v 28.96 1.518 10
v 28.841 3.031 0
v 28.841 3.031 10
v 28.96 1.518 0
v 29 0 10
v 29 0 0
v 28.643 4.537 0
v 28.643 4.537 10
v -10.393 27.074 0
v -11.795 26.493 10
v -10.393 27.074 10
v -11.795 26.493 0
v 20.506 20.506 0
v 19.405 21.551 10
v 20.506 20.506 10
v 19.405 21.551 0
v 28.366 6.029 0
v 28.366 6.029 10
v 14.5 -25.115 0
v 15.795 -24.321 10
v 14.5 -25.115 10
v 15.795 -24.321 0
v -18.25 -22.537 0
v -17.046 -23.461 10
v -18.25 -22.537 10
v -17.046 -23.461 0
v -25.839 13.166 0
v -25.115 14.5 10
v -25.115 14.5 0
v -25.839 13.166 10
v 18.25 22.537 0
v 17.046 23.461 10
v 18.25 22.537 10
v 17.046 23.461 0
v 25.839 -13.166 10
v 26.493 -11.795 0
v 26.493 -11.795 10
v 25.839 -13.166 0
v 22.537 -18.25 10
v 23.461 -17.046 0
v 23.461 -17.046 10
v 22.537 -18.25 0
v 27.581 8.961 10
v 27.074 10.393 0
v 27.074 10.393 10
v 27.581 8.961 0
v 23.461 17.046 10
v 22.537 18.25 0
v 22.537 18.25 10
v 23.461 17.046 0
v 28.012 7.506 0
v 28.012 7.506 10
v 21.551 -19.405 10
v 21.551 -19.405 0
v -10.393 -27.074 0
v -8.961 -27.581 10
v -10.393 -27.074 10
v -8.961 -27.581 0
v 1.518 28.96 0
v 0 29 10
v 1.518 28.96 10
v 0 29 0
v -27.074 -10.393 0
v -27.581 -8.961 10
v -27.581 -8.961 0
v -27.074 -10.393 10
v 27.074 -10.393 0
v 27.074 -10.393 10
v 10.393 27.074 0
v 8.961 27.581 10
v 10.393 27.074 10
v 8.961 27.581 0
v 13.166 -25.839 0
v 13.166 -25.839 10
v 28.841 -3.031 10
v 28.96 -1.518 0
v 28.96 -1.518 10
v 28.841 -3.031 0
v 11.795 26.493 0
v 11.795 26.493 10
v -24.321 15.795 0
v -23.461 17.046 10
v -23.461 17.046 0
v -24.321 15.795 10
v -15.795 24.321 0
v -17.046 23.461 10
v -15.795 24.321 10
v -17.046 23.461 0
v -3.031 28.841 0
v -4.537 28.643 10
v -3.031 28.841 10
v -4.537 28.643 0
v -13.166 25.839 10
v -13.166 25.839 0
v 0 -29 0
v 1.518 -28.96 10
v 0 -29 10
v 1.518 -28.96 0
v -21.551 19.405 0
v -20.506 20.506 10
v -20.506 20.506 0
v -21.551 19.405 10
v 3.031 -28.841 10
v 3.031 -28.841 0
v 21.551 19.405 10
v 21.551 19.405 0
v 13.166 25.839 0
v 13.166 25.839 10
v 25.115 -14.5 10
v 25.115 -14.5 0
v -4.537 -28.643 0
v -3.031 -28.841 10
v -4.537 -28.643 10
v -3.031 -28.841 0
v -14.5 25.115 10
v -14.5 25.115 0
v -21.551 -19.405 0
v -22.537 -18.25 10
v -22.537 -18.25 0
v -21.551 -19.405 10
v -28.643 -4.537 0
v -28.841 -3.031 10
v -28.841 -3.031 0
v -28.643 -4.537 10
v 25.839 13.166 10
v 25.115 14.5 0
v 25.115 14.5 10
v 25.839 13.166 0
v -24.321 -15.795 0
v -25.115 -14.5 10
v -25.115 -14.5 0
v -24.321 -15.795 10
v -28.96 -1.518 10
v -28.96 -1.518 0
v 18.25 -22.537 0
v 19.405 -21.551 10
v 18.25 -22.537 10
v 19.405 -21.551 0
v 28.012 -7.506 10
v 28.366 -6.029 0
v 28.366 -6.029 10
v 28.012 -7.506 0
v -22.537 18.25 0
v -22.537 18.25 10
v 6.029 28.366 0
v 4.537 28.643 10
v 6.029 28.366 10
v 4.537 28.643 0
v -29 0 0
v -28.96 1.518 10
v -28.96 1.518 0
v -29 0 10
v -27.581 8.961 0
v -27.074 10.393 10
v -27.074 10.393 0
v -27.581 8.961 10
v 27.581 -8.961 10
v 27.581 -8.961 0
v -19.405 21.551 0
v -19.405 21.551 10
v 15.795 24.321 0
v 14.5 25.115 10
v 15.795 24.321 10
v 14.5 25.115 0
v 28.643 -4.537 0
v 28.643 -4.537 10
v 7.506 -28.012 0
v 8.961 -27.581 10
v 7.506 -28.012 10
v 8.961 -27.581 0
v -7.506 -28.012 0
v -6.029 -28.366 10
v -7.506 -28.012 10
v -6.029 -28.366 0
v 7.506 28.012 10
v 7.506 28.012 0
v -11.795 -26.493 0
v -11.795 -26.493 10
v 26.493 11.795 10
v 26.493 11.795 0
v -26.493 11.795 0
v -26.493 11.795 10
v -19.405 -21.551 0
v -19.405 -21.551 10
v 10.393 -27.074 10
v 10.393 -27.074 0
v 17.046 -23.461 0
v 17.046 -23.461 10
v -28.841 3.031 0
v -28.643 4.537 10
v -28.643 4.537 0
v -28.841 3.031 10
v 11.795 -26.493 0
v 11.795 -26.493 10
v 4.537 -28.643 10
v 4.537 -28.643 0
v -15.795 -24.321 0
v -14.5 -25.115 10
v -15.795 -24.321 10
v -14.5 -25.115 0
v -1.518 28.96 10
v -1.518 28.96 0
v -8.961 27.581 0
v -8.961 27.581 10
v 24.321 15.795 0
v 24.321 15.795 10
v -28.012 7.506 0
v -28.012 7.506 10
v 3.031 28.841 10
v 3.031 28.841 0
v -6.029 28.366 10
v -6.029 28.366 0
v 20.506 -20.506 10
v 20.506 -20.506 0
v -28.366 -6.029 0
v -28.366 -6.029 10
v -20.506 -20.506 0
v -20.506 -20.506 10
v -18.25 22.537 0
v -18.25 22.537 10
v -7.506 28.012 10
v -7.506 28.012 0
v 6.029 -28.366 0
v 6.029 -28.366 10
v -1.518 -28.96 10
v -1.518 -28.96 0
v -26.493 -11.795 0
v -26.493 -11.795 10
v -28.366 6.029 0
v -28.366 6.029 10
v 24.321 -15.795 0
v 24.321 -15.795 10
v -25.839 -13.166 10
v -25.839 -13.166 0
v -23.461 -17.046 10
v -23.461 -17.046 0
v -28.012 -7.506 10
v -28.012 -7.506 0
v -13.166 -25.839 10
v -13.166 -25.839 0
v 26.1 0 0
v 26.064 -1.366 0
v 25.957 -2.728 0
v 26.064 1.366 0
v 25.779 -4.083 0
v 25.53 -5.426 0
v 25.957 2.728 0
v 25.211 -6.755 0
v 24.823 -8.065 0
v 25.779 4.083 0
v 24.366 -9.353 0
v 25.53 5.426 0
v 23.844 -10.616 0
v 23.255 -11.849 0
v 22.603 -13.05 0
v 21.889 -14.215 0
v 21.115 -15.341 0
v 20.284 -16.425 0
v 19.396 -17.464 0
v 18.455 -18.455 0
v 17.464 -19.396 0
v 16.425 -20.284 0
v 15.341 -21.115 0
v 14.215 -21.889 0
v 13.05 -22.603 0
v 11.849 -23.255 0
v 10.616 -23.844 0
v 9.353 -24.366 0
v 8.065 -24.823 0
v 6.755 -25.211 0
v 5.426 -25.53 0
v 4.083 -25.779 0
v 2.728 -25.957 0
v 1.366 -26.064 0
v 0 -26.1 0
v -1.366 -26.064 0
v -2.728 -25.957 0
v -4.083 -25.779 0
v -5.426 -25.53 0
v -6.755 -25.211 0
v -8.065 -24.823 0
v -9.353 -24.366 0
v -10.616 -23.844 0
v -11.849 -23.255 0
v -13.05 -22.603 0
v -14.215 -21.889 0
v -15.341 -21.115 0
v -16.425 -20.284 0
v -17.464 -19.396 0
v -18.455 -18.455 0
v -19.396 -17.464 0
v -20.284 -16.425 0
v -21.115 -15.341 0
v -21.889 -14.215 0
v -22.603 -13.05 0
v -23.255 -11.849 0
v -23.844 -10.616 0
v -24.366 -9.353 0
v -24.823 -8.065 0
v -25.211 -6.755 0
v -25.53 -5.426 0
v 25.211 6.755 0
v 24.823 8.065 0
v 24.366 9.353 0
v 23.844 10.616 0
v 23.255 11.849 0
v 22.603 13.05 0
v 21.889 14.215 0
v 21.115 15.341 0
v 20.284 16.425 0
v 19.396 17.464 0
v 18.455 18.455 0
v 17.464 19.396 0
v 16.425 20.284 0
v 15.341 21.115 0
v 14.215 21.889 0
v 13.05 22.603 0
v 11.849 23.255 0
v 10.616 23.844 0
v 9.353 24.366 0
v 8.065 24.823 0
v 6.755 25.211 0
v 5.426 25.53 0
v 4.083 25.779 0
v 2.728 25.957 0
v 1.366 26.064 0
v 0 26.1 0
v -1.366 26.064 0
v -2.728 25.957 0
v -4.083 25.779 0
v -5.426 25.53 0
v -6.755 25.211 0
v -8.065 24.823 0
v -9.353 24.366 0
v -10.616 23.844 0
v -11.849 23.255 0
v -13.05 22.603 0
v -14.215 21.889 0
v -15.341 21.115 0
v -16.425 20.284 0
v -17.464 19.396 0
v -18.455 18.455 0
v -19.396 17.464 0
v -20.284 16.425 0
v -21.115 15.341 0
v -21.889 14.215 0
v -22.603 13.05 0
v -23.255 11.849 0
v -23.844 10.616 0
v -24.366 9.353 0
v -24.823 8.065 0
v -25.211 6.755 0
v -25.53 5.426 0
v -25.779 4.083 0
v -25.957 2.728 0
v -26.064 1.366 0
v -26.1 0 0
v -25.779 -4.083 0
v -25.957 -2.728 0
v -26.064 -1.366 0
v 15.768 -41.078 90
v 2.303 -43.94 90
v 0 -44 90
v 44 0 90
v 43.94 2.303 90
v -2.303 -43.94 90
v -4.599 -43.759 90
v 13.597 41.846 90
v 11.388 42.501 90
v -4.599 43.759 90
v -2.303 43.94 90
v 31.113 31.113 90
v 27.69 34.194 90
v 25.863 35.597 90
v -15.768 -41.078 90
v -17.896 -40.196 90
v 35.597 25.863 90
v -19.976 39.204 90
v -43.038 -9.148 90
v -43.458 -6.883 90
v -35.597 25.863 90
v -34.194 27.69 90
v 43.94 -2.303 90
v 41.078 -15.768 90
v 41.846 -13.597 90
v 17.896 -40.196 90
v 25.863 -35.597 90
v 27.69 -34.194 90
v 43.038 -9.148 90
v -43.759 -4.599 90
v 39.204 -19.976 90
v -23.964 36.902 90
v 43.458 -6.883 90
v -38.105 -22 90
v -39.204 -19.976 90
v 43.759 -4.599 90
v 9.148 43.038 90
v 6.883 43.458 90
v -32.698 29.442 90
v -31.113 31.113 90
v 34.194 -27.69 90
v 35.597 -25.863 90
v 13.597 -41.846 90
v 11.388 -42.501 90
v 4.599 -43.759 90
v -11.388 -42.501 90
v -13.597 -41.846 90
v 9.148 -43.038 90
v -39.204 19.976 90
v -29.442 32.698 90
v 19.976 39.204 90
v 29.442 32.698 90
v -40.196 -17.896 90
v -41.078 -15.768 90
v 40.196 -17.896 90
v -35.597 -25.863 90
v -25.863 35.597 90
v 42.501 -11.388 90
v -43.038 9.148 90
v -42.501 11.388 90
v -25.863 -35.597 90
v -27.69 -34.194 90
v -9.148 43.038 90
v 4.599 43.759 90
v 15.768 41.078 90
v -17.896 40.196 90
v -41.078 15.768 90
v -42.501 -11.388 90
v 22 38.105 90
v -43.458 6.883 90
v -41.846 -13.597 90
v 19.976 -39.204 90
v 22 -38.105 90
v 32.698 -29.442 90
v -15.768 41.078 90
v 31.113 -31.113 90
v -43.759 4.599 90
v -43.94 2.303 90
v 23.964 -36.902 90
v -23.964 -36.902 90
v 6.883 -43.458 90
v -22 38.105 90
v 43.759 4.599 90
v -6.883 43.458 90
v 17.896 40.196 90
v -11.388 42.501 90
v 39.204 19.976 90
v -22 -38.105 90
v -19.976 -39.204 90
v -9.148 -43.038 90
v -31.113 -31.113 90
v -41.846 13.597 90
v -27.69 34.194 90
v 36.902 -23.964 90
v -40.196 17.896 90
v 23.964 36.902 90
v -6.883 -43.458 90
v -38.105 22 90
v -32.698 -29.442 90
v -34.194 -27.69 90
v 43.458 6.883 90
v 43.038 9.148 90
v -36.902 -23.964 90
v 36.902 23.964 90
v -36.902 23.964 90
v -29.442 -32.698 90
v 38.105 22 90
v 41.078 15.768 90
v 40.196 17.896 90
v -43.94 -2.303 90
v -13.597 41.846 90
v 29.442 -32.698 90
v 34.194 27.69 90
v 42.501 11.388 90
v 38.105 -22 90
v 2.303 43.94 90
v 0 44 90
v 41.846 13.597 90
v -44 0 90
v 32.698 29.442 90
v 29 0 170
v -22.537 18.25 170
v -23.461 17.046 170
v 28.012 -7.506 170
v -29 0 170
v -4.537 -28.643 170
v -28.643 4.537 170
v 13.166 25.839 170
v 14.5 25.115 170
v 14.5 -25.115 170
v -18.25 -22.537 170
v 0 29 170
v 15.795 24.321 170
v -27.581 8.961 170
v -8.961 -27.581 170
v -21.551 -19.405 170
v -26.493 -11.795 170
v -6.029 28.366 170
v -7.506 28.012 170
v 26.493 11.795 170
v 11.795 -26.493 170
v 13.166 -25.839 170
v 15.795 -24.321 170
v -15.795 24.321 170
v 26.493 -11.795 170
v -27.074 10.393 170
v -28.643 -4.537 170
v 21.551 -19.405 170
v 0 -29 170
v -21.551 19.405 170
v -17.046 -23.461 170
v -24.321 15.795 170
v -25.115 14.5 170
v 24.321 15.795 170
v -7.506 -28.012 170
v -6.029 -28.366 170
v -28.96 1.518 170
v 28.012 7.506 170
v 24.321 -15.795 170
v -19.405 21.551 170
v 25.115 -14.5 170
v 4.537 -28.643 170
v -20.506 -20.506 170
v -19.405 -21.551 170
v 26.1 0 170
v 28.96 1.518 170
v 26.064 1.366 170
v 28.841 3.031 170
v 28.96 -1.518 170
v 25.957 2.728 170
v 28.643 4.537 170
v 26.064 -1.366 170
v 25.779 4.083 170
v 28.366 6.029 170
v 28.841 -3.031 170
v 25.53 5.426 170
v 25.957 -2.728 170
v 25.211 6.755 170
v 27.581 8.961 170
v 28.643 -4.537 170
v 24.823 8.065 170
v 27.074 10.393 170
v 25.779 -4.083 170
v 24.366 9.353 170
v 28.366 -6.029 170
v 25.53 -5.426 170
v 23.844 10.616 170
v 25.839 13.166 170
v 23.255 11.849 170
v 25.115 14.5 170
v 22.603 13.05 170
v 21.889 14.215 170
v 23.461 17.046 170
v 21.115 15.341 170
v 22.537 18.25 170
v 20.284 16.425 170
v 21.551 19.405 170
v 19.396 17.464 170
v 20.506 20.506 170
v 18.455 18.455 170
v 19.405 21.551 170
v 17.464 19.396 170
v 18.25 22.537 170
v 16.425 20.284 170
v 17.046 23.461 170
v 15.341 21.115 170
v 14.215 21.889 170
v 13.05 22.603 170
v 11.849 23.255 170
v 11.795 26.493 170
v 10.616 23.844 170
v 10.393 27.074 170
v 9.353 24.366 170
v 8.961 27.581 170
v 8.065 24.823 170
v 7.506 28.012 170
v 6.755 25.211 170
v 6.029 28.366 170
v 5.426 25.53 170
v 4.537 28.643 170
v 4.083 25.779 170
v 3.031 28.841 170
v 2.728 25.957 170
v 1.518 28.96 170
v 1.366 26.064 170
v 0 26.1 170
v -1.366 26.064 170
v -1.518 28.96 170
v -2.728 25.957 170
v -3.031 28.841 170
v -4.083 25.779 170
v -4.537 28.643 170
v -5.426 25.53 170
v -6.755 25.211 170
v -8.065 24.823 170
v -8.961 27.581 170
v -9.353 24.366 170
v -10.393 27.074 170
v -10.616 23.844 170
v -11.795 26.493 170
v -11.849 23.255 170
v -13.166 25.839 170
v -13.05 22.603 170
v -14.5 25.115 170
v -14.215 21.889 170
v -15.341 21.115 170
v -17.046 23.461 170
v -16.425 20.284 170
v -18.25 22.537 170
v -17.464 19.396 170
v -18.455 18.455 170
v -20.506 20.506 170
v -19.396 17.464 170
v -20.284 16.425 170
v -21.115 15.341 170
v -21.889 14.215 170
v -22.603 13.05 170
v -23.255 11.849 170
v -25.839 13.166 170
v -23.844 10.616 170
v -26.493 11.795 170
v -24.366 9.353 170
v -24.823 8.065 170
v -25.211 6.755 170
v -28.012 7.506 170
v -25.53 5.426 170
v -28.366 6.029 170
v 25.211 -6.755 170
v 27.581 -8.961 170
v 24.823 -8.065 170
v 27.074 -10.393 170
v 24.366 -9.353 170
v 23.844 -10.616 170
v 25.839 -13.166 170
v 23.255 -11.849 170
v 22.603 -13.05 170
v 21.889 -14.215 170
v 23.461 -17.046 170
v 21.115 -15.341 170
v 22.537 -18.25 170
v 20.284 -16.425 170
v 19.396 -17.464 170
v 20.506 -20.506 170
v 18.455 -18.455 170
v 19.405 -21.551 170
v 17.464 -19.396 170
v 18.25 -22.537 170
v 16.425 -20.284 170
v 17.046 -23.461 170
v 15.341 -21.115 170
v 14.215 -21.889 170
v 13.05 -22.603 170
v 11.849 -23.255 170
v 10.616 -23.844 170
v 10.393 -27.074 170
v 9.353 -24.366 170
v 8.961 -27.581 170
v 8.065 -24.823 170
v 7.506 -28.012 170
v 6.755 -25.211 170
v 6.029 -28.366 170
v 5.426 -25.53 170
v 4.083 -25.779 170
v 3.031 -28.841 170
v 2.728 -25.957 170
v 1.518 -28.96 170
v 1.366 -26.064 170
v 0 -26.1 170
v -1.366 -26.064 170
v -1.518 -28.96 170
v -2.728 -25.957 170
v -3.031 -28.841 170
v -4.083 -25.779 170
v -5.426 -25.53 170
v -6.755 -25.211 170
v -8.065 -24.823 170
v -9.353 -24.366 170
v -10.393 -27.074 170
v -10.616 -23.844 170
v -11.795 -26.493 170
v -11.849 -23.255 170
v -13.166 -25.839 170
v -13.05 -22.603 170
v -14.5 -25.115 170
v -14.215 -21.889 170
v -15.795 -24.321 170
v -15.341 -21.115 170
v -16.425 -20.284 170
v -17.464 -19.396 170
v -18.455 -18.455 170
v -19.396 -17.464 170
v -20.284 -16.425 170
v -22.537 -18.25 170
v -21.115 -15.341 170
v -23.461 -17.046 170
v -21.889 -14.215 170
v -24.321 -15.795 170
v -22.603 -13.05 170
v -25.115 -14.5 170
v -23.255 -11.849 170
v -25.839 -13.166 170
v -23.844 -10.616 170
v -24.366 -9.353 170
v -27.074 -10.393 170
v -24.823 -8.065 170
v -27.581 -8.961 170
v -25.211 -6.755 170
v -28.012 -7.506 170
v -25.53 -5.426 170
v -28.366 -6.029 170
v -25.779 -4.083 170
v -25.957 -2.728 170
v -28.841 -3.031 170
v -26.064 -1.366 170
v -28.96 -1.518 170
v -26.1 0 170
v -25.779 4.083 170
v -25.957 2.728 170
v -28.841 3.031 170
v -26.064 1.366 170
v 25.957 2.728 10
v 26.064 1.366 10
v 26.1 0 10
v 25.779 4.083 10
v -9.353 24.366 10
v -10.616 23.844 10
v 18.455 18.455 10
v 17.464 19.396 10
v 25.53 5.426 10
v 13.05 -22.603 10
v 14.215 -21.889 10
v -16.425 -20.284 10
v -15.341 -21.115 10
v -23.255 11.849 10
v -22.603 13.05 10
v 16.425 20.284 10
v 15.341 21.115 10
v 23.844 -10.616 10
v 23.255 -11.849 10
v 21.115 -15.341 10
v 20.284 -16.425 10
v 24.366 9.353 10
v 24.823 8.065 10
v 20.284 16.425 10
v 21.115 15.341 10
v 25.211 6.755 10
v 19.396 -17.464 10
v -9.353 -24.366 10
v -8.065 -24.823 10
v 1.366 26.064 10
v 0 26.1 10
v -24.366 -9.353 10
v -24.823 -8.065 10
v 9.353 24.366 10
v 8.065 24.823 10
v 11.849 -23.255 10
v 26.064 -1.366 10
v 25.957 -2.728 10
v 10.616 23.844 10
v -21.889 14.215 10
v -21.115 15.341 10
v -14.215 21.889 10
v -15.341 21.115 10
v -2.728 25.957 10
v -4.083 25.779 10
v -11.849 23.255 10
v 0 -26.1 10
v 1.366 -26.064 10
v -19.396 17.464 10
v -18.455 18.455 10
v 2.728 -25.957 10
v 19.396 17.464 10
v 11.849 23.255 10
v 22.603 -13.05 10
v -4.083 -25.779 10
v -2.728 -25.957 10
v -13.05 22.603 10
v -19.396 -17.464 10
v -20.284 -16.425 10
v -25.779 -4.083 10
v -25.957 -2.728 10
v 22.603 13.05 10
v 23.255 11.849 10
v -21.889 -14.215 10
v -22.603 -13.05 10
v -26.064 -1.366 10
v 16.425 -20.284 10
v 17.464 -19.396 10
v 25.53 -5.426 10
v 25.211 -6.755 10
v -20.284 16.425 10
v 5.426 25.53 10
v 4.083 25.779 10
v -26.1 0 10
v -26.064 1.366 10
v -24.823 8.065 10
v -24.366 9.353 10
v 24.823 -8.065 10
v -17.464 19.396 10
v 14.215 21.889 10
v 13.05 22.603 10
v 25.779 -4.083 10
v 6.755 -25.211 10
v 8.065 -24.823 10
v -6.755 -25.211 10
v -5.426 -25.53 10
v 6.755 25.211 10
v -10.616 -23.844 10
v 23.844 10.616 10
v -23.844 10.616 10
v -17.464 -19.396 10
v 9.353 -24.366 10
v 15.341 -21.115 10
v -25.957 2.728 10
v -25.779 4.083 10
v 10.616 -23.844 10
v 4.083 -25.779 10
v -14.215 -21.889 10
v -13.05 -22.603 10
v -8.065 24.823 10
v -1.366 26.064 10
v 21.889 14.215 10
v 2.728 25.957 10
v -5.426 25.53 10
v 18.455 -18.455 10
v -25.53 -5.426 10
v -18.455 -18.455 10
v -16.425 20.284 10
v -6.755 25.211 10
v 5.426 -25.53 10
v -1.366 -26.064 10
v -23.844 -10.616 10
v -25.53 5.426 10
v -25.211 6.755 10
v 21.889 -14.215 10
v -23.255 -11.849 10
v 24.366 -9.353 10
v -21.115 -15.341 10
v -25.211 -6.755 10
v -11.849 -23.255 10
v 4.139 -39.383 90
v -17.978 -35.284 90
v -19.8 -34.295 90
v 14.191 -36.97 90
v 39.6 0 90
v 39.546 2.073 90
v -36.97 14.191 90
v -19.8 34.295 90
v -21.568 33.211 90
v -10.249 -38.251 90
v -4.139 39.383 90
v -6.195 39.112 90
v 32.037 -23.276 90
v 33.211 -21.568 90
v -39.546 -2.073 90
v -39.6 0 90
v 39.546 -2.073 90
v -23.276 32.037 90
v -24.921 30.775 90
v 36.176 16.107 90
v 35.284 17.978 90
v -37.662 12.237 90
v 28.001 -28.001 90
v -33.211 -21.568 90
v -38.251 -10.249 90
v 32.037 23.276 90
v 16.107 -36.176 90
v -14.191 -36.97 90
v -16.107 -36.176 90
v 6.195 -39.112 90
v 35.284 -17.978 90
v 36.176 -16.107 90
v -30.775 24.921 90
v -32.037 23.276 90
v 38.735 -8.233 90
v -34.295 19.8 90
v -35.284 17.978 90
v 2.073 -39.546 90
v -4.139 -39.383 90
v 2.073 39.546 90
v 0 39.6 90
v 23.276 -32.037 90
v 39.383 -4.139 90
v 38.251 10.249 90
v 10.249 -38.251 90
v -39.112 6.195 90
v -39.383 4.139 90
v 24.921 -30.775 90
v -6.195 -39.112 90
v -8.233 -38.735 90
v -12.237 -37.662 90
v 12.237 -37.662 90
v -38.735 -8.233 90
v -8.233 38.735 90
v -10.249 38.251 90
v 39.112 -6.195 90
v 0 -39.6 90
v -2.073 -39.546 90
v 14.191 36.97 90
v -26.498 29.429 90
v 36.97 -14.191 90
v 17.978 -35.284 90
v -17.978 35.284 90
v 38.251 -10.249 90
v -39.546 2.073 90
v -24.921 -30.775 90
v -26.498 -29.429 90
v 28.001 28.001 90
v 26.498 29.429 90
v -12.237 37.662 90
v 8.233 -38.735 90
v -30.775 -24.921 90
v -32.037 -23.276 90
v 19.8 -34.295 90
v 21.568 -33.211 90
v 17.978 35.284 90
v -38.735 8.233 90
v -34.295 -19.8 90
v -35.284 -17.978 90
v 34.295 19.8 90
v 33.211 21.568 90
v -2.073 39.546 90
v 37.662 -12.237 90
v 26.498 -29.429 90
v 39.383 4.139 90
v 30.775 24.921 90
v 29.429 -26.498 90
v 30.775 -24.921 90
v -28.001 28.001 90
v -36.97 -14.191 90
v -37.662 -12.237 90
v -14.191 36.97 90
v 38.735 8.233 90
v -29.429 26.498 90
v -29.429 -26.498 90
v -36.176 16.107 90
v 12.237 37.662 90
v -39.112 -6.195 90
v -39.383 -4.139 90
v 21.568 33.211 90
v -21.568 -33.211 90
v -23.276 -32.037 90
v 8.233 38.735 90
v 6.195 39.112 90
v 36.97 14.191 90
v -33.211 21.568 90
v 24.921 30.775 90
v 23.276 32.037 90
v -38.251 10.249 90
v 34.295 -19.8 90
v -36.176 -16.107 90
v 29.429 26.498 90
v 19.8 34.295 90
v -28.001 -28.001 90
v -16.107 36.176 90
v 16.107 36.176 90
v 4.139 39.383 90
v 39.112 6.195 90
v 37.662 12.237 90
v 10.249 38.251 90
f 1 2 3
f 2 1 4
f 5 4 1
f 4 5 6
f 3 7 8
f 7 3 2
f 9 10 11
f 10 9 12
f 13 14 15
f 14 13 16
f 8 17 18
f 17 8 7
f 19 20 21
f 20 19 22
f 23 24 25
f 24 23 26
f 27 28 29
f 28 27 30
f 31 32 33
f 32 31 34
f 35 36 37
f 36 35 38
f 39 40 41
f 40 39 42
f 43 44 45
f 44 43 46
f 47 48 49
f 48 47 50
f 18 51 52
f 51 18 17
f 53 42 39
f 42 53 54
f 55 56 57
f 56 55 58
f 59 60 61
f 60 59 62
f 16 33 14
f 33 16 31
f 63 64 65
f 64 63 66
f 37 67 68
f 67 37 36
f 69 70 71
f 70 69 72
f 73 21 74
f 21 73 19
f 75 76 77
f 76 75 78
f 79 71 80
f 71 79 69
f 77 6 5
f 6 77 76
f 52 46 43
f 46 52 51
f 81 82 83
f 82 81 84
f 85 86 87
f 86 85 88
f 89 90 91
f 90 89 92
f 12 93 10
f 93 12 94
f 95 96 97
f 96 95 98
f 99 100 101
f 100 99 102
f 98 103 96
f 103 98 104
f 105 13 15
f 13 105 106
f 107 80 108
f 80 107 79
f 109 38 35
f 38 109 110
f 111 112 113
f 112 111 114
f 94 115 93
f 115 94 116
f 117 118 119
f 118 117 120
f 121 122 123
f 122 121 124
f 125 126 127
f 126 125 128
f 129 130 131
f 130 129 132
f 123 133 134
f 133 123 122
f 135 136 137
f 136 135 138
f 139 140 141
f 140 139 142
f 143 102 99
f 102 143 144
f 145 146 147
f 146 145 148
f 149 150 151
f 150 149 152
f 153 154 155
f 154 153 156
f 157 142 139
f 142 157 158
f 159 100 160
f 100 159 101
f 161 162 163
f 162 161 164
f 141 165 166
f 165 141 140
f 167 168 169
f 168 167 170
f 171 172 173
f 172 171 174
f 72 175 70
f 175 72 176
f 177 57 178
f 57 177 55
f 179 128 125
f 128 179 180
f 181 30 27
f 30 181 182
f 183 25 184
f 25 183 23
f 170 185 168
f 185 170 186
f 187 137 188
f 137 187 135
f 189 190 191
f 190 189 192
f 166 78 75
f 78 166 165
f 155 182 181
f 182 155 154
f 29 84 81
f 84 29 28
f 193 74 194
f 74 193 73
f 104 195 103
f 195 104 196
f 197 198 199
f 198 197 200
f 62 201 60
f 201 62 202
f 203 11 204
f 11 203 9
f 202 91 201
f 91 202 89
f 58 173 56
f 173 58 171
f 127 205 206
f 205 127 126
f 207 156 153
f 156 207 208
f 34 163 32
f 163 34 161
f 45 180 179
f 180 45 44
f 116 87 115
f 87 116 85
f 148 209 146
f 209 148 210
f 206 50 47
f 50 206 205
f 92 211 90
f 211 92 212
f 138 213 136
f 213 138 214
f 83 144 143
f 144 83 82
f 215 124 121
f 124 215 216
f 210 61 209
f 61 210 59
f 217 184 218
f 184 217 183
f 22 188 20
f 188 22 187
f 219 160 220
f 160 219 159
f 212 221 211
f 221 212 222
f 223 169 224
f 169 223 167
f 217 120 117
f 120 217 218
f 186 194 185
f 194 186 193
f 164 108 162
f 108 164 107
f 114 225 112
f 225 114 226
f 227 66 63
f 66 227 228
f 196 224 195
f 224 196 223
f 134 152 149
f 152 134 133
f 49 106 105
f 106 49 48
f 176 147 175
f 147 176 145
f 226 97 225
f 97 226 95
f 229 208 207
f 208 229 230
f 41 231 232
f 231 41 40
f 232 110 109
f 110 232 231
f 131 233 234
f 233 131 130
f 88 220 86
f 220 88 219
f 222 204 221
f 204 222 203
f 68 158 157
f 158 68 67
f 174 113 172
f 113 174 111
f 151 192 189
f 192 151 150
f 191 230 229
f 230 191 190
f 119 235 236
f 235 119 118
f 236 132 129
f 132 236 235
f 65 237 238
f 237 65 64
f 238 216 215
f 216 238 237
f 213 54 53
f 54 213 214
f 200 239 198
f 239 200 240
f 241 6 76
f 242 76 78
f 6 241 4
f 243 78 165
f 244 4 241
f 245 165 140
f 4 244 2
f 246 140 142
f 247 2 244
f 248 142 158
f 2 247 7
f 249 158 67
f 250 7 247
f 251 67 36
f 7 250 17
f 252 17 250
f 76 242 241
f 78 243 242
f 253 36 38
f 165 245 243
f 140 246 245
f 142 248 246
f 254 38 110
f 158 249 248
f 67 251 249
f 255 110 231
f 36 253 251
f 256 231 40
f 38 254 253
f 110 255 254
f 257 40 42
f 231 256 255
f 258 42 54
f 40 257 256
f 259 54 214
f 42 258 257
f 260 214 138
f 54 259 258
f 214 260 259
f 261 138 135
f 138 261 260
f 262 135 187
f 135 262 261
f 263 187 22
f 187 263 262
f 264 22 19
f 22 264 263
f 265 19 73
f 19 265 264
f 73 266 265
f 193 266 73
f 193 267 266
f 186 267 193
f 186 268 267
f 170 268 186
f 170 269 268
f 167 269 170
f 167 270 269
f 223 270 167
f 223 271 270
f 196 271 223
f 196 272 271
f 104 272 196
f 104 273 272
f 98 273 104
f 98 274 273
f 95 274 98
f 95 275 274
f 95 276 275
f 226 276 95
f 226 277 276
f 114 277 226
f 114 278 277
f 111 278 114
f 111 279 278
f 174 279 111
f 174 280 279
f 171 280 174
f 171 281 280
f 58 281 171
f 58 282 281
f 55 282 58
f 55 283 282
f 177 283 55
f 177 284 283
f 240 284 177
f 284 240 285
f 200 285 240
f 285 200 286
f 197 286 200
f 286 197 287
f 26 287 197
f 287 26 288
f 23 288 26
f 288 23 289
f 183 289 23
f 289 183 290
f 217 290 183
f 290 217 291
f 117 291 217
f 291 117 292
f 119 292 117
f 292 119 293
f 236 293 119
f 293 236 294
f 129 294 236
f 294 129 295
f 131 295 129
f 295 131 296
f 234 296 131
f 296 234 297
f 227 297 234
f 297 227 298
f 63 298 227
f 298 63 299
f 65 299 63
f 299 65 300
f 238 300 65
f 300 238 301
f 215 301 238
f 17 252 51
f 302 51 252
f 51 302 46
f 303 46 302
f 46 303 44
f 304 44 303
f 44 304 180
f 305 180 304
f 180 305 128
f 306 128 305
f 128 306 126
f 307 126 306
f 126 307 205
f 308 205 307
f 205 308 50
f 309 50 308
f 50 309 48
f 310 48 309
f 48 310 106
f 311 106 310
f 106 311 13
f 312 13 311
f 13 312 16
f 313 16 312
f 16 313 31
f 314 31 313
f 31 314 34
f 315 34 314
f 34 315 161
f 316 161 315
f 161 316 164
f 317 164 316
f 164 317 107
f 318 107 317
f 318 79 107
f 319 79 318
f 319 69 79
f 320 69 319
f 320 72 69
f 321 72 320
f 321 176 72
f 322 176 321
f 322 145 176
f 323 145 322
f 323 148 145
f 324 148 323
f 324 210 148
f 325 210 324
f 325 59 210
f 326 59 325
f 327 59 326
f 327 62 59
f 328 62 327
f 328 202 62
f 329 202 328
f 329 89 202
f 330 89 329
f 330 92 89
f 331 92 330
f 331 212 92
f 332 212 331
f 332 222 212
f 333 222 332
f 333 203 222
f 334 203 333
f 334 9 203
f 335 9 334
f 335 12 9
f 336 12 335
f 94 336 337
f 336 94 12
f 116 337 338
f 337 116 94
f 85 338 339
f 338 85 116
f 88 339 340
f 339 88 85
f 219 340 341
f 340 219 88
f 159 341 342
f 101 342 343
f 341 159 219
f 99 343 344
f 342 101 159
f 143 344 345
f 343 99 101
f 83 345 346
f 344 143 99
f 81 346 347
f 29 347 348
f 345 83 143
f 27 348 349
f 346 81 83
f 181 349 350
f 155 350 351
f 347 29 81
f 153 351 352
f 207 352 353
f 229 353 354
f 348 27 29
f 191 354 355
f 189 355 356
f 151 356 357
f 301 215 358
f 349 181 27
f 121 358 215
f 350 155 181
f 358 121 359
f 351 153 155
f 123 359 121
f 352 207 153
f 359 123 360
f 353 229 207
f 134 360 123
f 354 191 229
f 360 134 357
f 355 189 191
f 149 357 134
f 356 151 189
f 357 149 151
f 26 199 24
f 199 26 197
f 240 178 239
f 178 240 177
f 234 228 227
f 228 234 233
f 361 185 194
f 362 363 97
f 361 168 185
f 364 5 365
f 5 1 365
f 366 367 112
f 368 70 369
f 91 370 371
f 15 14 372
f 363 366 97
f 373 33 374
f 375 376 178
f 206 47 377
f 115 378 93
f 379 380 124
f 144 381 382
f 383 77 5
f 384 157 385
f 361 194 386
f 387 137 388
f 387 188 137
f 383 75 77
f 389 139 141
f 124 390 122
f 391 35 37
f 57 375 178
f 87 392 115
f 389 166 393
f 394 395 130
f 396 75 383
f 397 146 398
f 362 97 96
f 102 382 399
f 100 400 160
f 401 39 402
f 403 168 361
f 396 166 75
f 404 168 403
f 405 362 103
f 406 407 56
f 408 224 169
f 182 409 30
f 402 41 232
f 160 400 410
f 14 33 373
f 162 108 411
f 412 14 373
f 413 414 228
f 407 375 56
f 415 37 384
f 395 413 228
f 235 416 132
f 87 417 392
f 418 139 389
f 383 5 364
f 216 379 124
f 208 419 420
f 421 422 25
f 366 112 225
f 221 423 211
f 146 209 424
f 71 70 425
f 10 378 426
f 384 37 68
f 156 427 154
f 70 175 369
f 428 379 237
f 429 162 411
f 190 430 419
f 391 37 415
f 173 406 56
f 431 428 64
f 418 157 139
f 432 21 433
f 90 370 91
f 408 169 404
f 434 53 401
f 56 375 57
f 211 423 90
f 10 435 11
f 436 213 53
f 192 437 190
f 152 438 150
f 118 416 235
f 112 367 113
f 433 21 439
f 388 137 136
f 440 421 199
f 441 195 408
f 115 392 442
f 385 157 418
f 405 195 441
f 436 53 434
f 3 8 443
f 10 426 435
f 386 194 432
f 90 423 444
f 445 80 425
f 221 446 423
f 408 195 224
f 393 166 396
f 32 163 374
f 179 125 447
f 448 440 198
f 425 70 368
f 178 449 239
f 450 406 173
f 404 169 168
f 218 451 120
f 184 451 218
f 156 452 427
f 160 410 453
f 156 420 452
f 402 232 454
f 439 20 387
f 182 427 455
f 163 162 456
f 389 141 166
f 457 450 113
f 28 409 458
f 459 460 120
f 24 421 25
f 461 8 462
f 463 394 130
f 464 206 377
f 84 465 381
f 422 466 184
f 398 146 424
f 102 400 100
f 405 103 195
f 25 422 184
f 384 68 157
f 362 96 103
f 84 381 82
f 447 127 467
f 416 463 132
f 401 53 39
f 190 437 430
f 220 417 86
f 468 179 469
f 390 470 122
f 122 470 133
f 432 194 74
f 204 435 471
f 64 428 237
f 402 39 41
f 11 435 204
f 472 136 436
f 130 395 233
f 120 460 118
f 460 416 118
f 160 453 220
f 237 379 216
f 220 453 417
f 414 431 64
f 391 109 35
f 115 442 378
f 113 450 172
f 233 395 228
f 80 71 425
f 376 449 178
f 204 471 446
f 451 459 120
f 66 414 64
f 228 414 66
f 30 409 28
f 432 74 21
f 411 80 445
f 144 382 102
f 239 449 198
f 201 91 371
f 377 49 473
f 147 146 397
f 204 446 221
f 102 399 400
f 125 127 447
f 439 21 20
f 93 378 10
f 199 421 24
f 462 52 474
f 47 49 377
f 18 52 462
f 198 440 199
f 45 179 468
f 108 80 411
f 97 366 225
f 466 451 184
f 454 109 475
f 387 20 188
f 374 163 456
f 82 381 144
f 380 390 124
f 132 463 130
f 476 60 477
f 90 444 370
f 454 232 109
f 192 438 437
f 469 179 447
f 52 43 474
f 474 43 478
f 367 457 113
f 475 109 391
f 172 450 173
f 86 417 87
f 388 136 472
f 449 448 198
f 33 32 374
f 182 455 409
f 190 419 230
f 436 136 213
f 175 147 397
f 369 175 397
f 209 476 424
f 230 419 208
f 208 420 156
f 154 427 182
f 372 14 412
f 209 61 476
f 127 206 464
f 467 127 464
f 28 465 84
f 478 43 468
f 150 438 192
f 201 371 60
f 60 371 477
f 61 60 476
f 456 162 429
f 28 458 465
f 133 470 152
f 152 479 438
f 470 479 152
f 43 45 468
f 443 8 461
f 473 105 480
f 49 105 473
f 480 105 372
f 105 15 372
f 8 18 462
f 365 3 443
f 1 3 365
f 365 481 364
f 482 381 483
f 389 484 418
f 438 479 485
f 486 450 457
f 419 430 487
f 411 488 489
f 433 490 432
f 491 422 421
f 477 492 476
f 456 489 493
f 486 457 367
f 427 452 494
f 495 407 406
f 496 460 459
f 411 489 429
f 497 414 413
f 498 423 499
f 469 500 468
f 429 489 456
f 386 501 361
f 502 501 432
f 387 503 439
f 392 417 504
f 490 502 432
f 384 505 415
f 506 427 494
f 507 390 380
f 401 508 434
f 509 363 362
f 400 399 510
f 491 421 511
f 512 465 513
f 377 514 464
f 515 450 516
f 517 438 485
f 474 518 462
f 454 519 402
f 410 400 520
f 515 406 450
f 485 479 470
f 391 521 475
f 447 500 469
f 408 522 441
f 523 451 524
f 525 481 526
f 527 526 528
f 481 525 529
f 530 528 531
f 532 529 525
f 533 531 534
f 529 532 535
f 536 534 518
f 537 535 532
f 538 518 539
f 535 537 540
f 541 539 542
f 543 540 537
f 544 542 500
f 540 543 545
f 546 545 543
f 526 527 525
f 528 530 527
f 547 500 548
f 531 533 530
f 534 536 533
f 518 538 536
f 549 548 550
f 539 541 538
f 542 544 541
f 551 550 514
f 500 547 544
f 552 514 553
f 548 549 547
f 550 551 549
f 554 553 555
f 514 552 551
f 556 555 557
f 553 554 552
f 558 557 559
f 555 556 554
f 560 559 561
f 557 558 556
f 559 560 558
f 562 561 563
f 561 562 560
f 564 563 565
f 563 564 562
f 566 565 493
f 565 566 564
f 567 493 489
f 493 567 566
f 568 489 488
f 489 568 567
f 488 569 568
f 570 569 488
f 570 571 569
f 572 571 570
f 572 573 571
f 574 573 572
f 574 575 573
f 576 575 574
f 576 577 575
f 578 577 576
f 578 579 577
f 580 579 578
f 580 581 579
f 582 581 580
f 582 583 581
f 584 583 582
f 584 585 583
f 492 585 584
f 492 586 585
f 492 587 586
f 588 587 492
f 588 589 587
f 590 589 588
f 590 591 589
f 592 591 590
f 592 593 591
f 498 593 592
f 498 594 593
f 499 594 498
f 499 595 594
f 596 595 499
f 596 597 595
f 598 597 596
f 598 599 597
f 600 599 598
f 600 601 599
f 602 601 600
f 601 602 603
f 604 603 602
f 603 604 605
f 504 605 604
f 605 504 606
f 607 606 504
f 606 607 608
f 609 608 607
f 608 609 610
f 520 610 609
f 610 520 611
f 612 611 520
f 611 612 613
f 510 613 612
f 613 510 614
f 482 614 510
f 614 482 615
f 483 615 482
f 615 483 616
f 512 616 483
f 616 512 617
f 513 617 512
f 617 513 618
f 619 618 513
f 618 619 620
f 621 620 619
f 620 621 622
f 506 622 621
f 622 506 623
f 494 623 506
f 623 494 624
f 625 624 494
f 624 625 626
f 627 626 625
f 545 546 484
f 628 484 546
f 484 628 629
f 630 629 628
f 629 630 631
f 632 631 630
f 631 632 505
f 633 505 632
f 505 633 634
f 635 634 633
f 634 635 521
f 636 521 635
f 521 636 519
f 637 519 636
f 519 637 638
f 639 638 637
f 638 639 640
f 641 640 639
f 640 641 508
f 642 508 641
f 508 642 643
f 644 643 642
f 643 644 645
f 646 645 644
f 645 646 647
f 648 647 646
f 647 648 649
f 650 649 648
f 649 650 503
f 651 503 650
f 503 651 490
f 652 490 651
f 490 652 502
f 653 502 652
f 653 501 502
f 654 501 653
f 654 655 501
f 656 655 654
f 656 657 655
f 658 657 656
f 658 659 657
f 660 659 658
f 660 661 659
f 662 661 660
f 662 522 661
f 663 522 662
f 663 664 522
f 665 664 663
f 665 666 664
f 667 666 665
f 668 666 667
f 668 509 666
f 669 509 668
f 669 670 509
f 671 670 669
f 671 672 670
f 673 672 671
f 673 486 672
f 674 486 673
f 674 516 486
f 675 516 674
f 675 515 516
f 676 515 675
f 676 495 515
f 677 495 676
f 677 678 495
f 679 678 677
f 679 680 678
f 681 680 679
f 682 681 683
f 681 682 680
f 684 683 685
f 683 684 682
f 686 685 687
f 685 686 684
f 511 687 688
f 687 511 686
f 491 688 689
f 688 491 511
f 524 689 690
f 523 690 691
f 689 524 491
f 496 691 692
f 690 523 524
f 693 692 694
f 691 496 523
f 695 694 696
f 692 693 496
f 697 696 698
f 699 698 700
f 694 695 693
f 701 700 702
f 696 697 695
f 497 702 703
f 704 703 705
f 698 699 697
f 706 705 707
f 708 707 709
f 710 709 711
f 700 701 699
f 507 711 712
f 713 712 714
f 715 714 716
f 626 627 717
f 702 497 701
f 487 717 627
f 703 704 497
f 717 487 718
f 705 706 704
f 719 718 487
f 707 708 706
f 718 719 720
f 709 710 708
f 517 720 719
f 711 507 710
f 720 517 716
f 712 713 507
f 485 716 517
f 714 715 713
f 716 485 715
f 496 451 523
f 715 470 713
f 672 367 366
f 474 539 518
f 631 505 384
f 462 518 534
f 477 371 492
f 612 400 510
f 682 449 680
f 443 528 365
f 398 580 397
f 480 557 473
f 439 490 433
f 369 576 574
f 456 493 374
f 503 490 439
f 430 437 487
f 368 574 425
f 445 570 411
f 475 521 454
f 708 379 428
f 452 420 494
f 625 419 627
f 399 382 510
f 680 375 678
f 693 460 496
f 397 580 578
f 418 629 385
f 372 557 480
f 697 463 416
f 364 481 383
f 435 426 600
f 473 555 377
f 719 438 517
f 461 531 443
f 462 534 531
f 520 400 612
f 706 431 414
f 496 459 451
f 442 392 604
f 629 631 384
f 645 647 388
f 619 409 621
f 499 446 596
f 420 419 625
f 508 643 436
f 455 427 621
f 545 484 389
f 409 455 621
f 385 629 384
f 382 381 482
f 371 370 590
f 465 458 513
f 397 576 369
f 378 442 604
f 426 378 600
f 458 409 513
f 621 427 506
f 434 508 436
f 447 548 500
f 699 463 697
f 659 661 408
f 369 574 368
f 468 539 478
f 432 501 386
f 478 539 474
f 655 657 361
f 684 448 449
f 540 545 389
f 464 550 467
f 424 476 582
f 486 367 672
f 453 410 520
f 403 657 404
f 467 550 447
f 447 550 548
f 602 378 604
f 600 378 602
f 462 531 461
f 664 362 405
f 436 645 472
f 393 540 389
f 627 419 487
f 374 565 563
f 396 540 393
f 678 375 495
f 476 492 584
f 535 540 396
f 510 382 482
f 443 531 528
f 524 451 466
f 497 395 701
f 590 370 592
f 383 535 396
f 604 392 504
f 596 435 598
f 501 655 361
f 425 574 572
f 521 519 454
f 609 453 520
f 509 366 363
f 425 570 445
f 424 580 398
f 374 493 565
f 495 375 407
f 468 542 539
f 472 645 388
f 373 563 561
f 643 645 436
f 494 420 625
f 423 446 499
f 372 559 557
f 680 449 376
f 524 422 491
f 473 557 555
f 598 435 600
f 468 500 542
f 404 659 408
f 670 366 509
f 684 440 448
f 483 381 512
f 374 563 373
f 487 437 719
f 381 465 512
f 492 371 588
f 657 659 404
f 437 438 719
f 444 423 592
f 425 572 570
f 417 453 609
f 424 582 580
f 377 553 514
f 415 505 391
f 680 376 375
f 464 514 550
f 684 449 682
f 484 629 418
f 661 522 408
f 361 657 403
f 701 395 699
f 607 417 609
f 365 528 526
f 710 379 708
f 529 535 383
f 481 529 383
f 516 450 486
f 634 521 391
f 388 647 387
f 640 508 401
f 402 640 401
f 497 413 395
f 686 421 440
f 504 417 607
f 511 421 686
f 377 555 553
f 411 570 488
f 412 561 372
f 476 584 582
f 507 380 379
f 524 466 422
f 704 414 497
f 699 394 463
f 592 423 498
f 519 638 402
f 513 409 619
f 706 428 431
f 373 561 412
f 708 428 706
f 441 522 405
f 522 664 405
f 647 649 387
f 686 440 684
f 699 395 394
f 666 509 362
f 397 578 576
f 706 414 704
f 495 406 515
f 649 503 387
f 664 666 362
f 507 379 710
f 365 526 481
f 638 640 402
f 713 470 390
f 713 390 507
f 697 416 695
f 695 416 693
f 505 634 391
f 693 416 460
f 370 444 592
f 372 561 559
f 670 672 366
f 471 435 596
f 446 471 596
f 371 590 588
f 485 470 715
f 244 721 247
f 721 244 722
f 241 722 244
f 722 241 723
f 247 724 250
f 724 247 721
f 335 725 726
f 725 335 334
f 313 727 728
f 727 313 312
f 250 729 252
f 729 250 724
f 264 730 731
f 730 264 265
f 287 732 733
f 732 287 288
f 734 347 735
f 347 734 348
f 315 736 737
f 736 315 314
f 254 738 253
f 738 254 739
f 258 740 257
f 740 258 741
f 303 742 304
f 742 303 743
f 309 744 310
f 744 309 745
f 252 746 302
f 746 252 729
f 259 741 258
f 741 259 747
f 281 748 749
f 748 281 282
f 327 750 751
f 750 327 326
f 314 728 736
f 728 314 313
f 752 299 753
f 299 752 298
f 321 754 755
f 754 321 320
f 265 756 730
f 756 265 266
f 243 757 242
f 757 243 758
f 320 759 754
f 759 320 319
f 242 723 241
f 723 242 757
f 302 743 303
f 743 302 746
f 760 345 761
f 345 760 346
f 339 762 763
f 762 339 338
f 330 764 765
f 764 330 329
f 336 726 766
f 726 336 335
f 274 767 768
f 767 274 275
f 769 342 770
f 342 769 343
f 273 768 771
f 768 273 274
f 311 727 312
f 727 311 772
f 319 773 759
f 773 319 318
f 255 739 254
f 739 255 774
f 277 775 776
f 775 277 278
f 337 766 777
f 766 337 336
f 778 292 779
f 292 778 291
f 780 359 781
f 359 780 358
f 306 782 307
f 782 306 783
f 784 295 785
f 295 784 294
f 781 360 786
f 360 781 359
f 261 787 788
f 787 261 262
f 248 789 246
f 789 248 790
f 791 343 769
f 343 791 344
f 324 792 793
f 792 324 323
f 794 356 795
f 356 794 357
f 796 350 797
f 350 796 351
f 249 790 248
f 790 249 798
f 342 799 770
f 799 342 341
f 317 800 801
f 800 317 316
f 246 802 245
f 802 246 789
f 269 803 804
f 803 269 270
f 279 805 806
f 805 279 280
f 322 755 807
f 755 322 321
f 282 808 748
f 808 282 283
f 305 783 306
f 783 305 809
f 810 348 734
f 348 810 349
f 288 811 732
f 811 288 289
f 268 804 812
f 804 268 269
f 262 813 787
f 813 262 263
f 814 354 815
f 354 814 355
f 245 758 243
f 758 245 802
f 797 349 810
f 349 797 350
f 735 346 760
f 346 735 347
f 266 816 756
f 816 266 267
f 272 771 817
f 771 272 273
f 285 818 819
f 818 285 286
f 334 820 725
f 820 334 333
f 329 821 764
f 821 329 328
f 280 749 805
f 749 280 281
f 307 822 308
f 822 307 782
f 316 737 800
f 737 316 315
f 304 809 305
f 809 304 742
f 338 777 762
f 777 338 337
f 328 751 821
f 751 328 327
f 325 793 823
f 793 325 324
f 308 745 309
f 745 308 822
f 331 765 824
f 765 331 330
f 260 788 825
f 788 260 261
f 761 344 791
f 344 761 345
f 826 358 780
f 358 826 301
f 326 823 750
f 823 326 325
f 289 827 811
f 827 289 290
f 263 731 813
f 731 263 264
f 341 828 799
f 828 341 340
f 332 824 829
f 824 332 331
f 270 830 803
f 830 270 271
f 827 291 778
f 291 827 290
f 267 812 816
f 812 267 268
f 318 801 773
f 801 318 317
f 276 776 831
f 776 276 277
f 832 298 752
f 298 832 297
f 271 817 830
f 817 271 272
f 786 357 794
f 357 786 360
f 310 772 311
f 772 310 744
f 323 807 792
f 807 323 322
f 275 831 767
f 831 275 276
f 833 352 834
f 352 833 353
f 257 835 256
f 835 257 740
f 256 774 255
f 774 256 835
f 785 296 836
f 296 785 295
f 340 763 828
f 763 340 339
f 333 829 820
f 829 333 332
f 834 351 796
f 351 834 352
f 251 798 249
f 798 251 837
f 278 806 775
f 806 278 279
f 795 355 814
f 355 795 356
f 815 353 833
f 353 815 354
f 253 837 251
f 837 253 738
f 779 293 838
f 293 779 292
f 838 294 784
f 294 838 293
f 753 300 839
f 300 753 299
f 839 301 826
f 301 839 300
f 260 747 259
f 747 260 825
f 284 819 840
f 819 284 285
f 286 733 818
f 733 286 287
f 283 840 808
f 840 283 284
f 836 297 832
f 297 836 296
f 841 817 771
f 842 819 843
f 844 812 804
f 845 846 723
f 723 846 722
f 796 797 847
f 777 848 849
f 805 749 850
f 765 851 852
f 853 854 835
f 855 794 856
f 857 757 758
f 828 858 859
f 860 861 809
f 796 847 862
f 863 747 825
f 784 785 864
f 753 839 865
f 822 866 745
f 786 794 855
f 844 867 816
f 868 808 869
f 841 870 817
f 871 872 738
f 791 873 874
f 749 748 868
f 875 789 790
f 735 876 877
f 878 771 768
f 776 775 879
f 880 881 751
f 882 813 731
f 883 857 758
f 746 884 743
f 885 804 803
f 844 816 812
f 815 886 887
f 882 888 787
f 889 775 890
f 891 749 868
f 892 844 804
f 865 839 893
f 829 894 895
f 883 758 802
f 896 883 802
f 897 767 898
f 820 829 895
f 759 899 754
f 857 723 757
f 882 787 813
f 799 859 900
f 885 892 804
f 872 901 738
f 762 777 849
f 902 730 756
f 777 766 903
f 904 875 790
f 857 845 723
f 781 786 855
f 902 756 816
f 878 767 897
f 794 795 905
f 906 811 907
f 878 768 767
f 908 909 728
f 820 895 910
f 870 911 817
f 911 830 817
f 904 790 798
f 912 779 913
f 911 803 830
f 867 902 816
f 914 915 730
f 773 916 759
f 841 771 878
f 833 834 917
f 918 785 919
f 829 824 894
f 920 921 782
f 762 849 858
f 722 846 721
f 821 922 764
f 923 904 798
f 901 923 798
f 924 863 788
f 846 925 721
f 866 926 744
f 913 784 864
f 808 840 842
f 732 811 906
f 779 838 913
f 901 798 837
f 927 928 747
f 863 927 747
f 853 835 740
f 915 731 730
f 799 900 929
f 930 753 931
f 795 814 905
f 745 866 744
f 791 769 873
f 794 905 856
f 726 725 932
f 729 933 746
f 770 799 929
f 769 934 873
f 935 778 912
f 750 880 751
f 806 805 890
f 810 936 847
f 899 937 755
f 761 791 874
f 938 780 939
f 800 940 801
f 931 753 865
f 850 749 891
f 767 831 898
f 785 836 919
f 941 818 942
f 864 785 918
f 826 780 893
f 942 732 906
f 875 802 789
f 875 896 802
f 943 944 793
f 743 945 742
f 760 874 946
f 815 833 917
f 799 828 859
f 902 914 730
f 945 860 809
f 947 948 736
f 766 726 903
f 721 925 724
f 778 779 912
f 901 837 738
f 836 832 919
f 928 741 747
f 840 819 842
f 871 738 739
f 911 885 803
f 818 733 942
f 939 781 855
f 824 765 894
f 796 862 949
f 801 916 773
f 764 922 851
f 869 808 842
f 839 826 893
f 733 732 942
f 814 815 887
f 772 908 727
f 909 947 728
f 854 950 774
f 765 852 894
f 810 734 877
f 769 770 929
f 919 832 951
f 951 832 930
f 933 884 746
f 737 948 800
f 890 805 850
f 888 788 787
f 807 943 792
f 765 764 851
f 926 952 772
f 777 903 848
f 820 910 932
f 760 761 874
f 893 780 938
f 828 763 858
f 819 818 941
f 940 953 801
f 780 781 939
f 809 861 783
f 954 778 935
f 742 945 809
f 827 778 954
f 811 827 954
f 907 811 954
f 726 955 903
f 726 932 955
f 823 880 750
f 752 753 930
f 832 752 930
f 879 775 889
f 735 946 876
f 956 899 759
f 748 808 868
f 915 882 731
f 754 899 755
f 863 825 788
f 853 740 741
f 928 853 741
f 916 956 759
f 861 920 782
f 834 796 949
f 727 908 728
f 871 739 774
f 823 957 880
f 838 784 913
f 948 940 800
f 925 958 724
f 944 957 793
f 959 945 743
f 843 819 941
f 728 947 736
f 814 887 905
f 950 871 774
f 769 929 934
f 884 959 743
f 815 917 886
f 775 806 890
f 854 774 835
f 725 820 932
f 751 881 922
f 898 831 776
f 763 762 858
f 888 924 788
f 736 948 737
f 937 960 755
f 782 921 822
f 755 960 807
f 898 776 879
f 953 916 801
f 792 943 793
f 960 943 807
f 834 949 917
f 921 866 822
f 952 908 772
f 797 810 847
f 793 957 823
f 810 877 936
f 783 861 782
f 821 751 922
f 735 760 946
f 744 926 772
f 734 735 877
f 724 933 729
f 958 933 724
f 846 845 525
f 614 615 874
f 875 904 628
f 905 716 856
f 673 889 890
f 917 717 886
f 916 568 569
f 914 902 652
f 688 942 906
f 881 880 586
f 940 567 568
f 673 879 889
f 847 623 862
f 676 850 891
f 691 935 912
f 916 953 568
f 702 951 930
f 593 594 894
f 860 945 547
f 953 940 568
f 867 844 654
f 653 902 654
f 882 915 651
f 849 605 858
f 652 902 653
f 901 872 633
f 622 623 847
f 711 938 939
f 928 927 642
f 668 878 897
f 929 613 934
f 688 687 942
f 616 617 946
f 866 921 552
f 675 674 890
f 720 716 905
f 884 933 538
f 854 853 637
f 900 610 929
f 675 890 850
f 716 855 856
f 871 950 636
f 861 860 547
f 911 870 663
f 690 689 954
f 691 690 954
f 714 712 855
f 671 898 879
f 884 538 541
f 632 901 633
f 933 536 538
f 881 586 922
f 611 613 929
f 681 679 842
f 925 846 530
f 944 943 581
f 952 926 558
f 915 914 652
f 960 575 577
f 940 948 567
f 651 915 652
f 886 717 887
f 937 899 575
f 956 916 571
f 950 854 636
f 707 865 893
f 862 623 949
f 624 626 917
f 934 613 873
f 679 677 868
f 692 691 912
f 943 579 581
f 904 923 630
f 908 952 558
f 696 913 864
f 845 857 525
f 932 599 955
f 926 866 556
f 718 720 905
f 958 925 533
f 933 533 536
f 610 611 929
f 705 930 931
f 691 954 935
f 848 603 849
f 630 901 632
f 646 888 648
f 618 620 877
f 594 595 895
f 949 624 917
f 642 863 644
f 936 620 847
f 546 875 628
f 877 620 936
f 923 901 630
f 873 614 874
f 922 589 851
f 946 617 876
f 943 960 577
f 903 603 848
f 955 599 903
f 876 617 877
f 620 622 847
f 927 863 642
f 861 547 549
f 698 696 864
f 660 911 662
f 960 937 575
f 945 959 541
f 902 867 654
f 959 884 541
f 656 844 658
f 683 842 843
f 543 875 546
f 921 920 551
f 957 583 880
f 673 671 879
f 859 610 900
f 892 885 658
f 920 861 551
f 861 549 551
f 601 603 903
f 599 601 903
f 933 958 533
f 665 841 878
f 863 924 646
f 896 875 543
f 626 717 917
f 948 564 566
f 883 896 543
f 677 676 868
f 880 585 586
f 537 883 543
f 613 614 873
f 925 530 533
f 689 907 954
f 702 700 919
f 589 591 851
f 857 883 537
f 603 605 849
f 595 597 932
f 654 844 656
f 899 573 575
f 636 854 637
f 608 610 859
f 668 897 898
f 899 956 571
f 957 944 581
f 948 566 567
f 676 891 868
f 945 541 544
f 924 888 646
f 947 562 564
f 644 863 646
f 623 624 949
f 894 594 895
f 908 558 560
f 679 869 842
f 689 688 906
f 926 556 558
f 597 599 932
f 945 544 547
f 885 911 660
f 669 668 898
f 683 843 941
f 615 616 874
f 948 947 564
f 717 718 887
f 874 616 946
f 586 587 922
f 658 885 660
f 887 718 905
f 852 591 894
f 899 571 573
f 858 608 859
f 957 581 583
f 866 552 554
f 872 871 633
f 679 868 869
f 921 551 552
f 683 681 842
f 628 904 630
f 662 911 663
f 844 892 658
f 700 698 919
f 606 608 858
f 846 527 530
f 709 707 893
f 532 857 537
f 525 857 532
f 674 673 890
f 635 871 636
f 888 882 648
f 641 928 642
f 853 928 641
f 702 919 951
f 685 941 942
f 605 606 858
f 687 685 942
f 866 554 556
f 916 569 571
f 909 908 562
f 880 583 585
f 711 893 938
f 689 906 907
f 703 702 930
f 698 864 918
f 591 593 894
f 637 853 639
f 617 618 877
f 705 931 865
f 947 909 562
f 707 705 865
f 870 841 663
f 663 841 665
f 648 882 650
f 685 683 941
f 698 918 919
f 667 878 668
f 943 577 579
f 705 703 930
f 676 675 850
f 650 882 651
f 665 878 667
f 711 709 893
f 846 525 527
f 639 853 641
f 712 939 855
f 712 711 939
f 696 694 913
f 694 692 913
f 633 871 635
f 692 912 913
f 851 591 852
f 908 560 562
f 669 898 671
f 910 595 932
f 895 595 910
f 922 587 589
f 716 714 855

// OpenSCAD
$fn=120;
r1=58/2;

r2=15;

difference() {
    union() {
        cylinder(10,r1,r1);
        translate([0,0,10]) cylinder(80,r1,r1+r2);
        translate([0,0,90]) cylinder(80,r1+r2,r1);
    }
    
    #scale([0.9,0.9,1]) {
        cylinder(10,r1,r1);
        translate([0,0,10]) cylinder(80,r1,r1+r2);
        translate([0,0,90]) cylinder(80,r1+r2,r1);
    }
 

}
